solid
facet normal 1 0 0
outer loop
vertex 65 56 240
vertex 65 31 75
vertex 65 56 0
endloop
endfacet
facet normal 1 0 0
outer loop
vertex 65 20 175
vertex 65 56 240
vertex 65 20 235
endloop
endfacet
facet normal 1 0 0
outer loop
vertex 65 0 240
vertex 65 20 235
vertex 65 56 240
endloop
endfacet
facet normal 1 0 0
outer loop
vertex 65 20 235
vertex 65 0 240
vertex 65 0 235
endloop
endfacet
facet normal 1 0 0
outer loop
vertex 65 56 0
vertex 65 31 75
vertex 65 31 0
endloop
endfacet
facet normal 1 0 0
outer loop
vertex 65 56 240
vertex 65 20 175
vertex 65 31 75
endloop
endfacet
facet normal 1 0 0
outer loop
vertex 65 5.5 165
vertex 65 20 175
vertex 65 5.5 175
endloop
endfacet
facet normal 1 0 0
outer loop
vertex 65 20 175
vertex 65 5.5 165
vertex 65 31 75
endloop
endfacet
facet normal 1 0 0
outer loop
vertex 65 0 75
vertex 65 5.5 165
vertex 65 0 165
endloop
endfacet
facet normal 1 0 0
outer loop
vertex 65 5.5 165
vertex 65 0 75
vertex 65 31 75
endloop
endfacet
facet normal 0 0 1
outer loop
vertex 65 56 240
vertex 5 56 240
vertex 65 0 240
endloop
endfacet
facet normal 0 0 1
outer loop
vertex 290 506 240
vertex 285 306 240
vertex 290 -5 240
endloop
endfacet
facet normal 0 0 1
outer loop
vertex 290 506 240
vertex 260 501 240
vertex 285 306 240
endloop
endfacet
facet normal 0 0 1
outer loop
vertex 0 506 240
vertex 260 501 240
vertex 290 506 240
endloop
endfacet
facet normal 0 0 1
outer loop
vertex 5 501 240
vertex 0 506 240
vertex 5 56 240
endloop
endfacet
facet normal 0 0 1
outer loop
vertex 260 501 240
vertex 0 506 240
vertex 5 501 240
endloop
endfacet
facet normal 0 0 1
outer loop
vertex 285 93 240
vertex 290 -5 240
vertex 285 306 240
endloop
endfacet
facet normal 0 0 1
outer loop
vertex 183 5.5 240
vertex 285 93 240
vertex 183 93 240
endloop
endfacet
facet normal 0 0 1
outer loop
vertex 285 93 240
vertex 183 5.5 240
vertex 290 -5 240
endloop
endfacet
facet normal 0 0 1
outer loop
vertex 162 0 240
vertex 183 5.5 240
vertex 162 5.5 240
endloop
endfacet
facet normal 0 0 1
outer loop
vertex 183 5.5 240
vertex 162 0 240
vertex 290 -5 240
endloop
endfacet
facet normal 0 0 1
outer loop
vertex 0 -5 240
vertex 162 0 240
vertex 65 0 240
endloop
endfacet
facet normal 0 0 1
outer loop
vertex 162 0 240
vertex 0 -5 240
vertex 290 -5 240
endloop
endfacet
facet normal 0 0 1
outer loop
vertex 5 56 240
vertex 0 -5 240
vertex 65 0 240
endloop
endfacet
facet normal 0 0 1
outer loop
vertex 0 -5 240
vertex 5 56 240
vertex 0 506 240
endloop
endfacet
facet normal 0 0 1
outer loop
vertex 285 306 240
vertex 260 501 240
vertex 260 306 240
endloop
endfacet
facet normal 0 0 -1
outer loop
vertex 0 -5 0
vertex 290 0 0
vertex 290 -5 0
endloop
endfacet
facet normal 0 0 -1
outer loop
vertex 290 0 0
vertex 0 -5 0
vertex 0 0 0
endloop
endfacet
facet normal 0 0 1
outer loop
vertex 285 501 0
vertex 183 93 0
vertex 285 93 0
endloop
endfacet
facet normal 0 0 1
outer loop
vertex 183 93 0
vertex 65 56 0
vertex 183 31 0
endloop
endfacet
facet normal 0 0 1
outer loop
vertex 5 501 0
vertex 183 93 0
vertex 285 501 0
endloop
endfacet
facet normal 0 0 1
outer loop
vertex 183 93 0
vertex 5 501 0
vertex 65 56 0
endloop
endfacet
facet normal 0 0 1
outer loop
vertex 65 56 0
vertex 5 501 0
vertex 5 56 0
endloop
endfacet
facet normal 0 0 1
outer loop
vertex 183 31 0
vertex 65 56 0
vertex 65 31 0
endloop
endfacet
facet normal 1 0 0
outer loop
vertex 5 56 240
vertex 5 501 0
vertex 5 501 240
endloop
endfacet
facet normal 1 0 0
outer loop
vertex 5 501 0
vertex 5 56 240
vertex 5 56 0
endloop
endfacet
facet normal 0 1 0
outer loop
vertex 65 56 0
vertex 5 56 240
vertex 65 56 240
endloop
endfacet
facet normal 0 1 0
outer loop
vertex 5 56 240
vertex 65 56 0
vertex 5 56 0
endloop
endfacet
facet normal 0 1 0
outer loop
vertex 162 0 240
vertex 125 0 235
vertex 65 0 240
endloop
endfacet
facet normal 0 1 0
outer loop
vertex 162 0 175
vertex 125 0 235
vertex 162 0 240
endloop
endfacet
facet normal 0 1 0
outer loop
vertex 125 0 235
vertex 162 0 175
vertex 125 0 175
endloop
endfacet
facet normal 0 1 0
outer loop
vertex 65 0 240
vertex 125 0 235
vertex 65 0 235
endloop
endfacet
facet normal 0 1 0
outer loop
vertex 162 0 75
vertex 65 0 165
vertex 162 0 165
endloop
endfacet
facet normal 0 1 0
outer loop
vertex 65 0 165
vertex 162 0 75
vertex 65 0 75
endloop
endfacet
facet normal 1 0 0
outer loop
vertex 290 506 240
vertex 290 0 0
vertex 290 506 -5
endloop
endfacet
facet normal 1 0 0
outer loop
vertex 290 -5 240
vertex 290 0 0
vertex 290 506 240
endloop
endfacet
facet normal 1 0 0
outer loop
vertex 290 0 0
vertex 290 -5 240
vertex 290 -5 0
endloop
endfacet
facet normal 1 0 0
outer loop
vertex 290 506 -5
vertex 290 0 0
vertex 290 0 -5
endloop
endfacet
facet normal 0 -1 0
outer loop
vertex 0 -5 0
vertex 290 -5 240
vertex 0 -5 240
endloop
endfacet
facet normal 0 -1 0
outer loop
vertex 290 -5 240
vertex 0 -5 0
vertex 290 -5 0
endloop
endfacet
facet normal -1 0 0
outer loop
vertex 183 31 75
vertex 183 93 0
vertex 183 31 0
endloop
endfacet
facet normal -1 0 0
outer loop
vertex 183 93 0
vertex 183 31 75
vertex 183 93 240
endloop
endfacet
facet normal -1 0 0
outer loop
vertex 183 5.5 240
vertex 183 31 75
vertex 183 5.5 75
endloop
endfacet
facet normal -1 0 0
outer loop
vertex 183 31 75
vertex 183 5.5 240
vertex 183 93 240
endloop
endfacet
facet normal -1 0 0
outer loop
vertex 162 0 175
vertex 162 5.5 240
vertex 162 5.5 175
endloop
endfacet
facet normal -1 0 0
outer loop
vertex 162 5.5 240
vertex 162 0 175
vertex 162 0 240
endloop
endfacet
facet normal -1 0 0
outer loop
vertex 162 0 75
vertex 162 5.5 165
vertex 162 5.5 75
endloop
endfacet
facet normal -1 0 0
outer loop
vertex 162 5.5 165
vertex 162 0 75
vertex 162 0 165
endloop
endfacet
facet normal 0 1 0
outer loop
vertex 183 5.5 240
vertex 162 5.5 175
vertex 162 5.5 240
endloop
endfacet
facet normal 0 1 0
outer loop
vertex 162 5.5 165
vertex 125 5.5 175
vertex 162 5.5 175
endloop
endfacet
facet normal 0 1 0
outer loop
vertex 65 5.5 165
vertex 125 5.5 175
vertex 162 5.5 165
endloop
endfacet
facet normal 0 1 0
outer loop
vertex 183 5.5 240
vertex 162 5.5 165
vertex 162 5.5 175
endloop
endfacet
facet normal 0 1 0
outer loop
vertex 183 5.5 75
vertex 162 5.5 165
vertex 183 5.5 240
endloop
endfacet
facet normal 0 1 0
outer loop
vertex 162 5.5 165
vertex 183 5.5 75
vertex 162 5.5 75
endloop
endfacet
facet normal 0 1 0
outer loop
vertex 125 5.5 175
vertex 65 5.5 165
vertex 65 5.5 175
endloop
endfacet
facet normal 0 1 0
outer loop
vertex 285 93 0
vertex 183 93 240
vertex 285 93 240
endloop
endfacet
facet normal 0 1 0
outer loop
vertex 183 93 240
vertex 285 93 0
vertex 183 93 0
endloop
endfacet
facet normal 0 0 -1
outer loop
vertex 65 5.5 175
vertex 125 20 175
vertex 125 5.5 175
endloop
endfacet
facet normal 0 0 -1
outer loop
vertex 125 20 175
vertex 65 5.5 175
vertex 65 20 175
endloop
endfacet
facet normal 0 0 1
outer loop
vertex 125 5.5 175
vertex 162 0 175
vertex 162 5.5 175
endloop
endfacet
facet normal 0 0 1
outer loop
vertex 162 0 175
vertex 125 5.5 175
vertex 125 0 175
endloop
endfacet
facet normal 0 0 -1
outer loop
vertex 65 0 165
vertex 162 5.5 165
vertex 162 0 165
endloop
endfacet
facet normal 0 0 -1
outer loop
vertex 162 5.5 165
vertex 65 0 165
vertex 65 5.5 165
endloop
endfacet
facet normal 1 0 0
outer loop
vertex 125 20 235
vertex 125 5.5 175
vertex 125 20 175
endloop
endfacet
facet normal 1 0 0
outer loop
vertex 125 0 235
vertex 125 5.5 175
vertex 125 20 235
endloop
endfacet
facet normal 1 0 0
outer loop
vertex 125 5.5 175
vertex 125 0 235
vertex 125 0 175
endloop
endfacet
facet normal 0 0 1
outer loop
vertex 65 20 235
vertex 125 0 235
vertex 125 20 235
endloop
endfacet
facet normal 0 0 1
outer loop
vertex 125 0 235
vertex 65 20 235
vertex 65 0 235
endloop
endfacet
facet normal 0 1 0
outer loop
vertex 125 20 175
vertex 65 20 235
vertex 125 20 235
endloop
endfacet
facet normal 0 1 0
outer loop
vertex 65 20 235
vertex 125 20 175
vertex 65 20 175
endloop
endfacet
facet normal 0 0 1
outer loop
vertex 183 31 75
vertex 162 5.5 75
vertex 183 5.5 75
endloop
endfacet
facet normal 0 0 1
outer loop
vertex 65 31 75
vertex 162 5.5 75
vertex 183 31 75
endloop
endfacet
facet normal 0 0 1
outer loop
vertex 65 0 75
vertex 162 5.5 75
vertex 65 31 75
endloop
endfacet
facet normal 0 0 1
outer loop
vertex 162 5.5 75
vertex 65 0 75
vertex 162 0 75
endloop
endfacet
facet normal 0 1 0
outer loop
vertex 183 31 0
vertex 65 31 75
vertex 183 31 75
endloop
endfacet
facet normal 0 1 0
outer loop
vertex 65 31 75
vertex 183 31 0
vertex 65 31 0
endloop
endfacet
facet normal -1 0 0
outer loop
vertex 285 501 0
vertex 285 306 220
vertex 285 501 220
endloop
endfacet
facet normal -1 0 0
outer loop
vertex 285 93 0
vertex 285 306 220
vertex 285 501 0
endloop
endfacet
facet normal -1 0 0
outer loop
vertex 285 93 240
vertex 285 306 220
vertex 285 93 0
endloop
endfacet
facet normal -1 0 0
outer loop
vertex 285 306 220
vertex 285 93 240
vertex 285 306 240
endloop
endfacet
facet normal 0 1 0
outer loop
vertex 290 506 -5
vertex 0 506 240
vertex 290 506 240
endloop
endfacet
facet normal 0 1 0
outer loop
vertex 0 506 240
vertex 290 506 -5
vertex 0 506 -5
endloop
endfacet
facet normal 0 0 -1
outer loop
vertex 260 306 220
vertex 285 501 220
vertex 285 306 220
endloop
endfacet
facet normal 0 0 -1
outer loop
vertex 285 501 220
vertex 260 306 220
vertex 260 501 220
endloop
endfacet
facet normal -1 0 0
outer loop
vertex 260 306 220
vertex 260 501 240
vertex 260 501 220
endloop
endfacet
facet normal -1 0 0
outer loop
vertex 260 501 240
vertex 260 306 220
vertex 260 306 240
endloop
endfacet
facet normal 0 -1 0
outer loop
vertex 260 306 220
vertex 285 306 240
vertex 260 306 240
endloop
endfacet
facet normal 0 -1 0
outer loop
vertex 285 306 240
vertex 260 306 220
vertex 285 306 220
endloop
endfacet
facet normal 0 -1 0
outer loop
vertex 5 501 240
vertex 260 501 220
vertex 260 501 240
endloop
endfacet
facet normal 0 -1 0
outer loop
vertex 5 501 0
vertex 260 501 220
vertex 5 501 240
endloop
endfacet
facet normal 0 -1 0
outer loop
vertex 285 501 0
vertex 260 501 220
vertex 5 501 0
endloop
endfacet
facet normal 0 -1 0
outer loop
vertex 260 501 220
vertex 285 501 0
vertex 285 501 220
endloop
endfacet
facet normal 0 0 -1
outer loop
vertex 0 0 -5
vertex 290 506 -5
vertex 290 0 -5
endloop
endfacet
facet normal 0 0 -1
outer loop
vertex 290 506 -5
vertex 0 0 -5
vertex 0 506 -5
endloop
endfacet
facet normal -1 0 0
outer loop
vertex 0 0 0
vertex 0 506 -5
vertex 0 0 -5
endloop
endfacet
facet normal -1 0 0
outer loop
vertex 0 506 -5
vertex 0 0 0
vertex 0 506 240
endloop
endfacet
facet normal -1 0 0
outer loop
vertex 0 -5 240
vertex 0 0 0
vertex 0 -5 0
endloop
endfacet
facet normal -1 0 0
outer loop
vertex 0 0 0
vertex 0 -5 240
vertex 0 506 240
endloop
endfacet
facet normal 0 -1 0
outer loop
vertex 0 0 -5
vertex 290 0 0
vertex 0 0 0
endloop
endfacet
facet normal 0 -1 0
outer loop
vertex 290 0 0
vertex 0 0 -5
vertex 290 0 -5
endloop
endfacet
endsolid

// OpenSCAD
// Office

// Office Requirements
// - spot for printer/scanner/supplies (paper, toners)
// - at least desk space for 2 people, a desk is defined by:
//   - at least 2 mounted screens
//   - decent speakers
//   - small ups
//   - room to put papers
//   - in total around +- 2.5meters of horizontal space, perhaps 2m
// - standing desks
// - a place to brainstorm/place to sit with a client
// - motivational colors and decoration

ceiling_door_gap = 30;

door_trim_height = 210;
door_trim_width = 90;
door_wall_gap = 20;
toilet_wall_width = 107;
toilet_wall_length = 93;
cable_gutter_width = 21;
cable_gutter_length = 5.5;
electric_wall_width = 97;
vent_length = 56;
vent_width = 60;
side_wall_length = 450;
room_width = 285;
inner_wall_length = 303;

transfos_margin = 5;
transfos_height = 60;
transfos_width = 60;
transfos_depth = 20;
transfos_gutter = 10;

heating_depth = 31;
heating_height = 75;

edge_height = 20;
edge_depth = 25;
edge_length = 200;

side_wall_window = 52;
inner_wall_window = 76;
window_bottom = 92;
window_top = 31;

wall_height = door_trim_height + ceiling_door_gap;
room_length = side_wall_length + vent_length; // 508

stone_floor();
side_wall();
vent_wall();
inner_wall();
window_wall();

// x, y, z

module stone_floor() {
  translate([0, 0, -5])
    color("GhostWhite") cube([room_width + 5, room_length, 5]);
}

module side_wall() {
  translate([0, -5, 0])
    color("AntiqueWhite") cube([5, room_length + 5, wall_height]);
}

module vent_wall() {
  translate([5, 0, 0])
    color("Green") cube([vent_width, vent_length, wall_height]);

  translate([5, -5, 0])
    // color("AntiqueWhite") cube([vent_width + electric_wall_width + cable_gutter_width, 5, wall_height]);
    color("AntiqueWhite") cube([room_width, 5, wall_height]);

  translate([5 + vent_width + electric_wall_width, 0, 0])
    color("Silver") cube([cable_gutter_width, cable_gutter_length, wall_height]);

  translate([5 + vent_width + electric_wall_width + cable_gutter_width, 0, 0])
    color("AntiqueWhite") cube([toilet_wall_width, toilet_wall_length, wall_height]);

  translate([5 + vent_width, 0, wall_height - transfos_height - transfos_gutter - transfos_margin])
    color("Silver") cube([electric_wall_width, cable_gutter_length, transfos_gutter]);

  translate([5 + vent_width, 0, wall_height - transfos_height - transfos_margin])
    color("Gray") cube([transfos_width, transfos_depth, transfos_height]);

  translate([5 + vent_width, 0, 0])
    color("Green") cube([electric_wall_width + cable_gutter_width, heating_depth, heating_height]);
}

module inner_wall() {
  inner_wall_offset = vent_width + electric_wall_width + cable_gutter_width + toilet_wall_width;

  translate([inner_wall_offset, toilet_wall_length, 0])
    color("AntiqueWhite") cube([5, door_wall_gap, wall_height]);

  translate([inner_wall_offset, toilet_wall_length + door_wall_gap, 0])
    color("Maroon") cube([5, door_trim_width, door_trim_height]);

  translate([inner_wall_offset, toilet_wall_length + door_wall_gap, door_trim_height])
    color("AntiqueWhite") cube([5, door_trim_width, ceiling_door_gap]);

  translate([inner_wall_offset, toilet_wall_length + door_wall_gap + door_trim_width, 0])
    color("AntiqueWhite") cube([5, inner_wall_length, wall_height]);

  translate([inner_wall_offset - edge_depth, room_length - edge_length, wall_height - edge_height])
    color("AntiqueWhite") cube([edge_depth, edge_length, edge_height]);
}

module window_wall() {
  translate([5, room_length - 5, 0])
    color("AntiqueWhite") cube([side_wall_window, 5, wall_height]);

  translate([5 + side_wall_window, room_length - 5, 0])
    color("AntiqueWhite") cube([room_width - side_wall_window - inner_wall_window, 5, window_bottom]);

  translate([5 + side_wall_window, room_length - 5, wall_height - window_top])
    color("AntiqueWhite") cube([room_width - side_wall_window - inner_wall_window, 5, window_top]);

  translate([room_width - inner_wall_window, room_length - 5, 0])
    color("AntiqueWhite") cube([inner_wall_window, 5, wall_height]);

  translate([5 + side_wall_window, room_length - 5, window_bottom])
    color("Aqua") cube([room_width - side_wall_window - inner_wall_window, 5, wall_height - window_bottom - window_top]);
}
